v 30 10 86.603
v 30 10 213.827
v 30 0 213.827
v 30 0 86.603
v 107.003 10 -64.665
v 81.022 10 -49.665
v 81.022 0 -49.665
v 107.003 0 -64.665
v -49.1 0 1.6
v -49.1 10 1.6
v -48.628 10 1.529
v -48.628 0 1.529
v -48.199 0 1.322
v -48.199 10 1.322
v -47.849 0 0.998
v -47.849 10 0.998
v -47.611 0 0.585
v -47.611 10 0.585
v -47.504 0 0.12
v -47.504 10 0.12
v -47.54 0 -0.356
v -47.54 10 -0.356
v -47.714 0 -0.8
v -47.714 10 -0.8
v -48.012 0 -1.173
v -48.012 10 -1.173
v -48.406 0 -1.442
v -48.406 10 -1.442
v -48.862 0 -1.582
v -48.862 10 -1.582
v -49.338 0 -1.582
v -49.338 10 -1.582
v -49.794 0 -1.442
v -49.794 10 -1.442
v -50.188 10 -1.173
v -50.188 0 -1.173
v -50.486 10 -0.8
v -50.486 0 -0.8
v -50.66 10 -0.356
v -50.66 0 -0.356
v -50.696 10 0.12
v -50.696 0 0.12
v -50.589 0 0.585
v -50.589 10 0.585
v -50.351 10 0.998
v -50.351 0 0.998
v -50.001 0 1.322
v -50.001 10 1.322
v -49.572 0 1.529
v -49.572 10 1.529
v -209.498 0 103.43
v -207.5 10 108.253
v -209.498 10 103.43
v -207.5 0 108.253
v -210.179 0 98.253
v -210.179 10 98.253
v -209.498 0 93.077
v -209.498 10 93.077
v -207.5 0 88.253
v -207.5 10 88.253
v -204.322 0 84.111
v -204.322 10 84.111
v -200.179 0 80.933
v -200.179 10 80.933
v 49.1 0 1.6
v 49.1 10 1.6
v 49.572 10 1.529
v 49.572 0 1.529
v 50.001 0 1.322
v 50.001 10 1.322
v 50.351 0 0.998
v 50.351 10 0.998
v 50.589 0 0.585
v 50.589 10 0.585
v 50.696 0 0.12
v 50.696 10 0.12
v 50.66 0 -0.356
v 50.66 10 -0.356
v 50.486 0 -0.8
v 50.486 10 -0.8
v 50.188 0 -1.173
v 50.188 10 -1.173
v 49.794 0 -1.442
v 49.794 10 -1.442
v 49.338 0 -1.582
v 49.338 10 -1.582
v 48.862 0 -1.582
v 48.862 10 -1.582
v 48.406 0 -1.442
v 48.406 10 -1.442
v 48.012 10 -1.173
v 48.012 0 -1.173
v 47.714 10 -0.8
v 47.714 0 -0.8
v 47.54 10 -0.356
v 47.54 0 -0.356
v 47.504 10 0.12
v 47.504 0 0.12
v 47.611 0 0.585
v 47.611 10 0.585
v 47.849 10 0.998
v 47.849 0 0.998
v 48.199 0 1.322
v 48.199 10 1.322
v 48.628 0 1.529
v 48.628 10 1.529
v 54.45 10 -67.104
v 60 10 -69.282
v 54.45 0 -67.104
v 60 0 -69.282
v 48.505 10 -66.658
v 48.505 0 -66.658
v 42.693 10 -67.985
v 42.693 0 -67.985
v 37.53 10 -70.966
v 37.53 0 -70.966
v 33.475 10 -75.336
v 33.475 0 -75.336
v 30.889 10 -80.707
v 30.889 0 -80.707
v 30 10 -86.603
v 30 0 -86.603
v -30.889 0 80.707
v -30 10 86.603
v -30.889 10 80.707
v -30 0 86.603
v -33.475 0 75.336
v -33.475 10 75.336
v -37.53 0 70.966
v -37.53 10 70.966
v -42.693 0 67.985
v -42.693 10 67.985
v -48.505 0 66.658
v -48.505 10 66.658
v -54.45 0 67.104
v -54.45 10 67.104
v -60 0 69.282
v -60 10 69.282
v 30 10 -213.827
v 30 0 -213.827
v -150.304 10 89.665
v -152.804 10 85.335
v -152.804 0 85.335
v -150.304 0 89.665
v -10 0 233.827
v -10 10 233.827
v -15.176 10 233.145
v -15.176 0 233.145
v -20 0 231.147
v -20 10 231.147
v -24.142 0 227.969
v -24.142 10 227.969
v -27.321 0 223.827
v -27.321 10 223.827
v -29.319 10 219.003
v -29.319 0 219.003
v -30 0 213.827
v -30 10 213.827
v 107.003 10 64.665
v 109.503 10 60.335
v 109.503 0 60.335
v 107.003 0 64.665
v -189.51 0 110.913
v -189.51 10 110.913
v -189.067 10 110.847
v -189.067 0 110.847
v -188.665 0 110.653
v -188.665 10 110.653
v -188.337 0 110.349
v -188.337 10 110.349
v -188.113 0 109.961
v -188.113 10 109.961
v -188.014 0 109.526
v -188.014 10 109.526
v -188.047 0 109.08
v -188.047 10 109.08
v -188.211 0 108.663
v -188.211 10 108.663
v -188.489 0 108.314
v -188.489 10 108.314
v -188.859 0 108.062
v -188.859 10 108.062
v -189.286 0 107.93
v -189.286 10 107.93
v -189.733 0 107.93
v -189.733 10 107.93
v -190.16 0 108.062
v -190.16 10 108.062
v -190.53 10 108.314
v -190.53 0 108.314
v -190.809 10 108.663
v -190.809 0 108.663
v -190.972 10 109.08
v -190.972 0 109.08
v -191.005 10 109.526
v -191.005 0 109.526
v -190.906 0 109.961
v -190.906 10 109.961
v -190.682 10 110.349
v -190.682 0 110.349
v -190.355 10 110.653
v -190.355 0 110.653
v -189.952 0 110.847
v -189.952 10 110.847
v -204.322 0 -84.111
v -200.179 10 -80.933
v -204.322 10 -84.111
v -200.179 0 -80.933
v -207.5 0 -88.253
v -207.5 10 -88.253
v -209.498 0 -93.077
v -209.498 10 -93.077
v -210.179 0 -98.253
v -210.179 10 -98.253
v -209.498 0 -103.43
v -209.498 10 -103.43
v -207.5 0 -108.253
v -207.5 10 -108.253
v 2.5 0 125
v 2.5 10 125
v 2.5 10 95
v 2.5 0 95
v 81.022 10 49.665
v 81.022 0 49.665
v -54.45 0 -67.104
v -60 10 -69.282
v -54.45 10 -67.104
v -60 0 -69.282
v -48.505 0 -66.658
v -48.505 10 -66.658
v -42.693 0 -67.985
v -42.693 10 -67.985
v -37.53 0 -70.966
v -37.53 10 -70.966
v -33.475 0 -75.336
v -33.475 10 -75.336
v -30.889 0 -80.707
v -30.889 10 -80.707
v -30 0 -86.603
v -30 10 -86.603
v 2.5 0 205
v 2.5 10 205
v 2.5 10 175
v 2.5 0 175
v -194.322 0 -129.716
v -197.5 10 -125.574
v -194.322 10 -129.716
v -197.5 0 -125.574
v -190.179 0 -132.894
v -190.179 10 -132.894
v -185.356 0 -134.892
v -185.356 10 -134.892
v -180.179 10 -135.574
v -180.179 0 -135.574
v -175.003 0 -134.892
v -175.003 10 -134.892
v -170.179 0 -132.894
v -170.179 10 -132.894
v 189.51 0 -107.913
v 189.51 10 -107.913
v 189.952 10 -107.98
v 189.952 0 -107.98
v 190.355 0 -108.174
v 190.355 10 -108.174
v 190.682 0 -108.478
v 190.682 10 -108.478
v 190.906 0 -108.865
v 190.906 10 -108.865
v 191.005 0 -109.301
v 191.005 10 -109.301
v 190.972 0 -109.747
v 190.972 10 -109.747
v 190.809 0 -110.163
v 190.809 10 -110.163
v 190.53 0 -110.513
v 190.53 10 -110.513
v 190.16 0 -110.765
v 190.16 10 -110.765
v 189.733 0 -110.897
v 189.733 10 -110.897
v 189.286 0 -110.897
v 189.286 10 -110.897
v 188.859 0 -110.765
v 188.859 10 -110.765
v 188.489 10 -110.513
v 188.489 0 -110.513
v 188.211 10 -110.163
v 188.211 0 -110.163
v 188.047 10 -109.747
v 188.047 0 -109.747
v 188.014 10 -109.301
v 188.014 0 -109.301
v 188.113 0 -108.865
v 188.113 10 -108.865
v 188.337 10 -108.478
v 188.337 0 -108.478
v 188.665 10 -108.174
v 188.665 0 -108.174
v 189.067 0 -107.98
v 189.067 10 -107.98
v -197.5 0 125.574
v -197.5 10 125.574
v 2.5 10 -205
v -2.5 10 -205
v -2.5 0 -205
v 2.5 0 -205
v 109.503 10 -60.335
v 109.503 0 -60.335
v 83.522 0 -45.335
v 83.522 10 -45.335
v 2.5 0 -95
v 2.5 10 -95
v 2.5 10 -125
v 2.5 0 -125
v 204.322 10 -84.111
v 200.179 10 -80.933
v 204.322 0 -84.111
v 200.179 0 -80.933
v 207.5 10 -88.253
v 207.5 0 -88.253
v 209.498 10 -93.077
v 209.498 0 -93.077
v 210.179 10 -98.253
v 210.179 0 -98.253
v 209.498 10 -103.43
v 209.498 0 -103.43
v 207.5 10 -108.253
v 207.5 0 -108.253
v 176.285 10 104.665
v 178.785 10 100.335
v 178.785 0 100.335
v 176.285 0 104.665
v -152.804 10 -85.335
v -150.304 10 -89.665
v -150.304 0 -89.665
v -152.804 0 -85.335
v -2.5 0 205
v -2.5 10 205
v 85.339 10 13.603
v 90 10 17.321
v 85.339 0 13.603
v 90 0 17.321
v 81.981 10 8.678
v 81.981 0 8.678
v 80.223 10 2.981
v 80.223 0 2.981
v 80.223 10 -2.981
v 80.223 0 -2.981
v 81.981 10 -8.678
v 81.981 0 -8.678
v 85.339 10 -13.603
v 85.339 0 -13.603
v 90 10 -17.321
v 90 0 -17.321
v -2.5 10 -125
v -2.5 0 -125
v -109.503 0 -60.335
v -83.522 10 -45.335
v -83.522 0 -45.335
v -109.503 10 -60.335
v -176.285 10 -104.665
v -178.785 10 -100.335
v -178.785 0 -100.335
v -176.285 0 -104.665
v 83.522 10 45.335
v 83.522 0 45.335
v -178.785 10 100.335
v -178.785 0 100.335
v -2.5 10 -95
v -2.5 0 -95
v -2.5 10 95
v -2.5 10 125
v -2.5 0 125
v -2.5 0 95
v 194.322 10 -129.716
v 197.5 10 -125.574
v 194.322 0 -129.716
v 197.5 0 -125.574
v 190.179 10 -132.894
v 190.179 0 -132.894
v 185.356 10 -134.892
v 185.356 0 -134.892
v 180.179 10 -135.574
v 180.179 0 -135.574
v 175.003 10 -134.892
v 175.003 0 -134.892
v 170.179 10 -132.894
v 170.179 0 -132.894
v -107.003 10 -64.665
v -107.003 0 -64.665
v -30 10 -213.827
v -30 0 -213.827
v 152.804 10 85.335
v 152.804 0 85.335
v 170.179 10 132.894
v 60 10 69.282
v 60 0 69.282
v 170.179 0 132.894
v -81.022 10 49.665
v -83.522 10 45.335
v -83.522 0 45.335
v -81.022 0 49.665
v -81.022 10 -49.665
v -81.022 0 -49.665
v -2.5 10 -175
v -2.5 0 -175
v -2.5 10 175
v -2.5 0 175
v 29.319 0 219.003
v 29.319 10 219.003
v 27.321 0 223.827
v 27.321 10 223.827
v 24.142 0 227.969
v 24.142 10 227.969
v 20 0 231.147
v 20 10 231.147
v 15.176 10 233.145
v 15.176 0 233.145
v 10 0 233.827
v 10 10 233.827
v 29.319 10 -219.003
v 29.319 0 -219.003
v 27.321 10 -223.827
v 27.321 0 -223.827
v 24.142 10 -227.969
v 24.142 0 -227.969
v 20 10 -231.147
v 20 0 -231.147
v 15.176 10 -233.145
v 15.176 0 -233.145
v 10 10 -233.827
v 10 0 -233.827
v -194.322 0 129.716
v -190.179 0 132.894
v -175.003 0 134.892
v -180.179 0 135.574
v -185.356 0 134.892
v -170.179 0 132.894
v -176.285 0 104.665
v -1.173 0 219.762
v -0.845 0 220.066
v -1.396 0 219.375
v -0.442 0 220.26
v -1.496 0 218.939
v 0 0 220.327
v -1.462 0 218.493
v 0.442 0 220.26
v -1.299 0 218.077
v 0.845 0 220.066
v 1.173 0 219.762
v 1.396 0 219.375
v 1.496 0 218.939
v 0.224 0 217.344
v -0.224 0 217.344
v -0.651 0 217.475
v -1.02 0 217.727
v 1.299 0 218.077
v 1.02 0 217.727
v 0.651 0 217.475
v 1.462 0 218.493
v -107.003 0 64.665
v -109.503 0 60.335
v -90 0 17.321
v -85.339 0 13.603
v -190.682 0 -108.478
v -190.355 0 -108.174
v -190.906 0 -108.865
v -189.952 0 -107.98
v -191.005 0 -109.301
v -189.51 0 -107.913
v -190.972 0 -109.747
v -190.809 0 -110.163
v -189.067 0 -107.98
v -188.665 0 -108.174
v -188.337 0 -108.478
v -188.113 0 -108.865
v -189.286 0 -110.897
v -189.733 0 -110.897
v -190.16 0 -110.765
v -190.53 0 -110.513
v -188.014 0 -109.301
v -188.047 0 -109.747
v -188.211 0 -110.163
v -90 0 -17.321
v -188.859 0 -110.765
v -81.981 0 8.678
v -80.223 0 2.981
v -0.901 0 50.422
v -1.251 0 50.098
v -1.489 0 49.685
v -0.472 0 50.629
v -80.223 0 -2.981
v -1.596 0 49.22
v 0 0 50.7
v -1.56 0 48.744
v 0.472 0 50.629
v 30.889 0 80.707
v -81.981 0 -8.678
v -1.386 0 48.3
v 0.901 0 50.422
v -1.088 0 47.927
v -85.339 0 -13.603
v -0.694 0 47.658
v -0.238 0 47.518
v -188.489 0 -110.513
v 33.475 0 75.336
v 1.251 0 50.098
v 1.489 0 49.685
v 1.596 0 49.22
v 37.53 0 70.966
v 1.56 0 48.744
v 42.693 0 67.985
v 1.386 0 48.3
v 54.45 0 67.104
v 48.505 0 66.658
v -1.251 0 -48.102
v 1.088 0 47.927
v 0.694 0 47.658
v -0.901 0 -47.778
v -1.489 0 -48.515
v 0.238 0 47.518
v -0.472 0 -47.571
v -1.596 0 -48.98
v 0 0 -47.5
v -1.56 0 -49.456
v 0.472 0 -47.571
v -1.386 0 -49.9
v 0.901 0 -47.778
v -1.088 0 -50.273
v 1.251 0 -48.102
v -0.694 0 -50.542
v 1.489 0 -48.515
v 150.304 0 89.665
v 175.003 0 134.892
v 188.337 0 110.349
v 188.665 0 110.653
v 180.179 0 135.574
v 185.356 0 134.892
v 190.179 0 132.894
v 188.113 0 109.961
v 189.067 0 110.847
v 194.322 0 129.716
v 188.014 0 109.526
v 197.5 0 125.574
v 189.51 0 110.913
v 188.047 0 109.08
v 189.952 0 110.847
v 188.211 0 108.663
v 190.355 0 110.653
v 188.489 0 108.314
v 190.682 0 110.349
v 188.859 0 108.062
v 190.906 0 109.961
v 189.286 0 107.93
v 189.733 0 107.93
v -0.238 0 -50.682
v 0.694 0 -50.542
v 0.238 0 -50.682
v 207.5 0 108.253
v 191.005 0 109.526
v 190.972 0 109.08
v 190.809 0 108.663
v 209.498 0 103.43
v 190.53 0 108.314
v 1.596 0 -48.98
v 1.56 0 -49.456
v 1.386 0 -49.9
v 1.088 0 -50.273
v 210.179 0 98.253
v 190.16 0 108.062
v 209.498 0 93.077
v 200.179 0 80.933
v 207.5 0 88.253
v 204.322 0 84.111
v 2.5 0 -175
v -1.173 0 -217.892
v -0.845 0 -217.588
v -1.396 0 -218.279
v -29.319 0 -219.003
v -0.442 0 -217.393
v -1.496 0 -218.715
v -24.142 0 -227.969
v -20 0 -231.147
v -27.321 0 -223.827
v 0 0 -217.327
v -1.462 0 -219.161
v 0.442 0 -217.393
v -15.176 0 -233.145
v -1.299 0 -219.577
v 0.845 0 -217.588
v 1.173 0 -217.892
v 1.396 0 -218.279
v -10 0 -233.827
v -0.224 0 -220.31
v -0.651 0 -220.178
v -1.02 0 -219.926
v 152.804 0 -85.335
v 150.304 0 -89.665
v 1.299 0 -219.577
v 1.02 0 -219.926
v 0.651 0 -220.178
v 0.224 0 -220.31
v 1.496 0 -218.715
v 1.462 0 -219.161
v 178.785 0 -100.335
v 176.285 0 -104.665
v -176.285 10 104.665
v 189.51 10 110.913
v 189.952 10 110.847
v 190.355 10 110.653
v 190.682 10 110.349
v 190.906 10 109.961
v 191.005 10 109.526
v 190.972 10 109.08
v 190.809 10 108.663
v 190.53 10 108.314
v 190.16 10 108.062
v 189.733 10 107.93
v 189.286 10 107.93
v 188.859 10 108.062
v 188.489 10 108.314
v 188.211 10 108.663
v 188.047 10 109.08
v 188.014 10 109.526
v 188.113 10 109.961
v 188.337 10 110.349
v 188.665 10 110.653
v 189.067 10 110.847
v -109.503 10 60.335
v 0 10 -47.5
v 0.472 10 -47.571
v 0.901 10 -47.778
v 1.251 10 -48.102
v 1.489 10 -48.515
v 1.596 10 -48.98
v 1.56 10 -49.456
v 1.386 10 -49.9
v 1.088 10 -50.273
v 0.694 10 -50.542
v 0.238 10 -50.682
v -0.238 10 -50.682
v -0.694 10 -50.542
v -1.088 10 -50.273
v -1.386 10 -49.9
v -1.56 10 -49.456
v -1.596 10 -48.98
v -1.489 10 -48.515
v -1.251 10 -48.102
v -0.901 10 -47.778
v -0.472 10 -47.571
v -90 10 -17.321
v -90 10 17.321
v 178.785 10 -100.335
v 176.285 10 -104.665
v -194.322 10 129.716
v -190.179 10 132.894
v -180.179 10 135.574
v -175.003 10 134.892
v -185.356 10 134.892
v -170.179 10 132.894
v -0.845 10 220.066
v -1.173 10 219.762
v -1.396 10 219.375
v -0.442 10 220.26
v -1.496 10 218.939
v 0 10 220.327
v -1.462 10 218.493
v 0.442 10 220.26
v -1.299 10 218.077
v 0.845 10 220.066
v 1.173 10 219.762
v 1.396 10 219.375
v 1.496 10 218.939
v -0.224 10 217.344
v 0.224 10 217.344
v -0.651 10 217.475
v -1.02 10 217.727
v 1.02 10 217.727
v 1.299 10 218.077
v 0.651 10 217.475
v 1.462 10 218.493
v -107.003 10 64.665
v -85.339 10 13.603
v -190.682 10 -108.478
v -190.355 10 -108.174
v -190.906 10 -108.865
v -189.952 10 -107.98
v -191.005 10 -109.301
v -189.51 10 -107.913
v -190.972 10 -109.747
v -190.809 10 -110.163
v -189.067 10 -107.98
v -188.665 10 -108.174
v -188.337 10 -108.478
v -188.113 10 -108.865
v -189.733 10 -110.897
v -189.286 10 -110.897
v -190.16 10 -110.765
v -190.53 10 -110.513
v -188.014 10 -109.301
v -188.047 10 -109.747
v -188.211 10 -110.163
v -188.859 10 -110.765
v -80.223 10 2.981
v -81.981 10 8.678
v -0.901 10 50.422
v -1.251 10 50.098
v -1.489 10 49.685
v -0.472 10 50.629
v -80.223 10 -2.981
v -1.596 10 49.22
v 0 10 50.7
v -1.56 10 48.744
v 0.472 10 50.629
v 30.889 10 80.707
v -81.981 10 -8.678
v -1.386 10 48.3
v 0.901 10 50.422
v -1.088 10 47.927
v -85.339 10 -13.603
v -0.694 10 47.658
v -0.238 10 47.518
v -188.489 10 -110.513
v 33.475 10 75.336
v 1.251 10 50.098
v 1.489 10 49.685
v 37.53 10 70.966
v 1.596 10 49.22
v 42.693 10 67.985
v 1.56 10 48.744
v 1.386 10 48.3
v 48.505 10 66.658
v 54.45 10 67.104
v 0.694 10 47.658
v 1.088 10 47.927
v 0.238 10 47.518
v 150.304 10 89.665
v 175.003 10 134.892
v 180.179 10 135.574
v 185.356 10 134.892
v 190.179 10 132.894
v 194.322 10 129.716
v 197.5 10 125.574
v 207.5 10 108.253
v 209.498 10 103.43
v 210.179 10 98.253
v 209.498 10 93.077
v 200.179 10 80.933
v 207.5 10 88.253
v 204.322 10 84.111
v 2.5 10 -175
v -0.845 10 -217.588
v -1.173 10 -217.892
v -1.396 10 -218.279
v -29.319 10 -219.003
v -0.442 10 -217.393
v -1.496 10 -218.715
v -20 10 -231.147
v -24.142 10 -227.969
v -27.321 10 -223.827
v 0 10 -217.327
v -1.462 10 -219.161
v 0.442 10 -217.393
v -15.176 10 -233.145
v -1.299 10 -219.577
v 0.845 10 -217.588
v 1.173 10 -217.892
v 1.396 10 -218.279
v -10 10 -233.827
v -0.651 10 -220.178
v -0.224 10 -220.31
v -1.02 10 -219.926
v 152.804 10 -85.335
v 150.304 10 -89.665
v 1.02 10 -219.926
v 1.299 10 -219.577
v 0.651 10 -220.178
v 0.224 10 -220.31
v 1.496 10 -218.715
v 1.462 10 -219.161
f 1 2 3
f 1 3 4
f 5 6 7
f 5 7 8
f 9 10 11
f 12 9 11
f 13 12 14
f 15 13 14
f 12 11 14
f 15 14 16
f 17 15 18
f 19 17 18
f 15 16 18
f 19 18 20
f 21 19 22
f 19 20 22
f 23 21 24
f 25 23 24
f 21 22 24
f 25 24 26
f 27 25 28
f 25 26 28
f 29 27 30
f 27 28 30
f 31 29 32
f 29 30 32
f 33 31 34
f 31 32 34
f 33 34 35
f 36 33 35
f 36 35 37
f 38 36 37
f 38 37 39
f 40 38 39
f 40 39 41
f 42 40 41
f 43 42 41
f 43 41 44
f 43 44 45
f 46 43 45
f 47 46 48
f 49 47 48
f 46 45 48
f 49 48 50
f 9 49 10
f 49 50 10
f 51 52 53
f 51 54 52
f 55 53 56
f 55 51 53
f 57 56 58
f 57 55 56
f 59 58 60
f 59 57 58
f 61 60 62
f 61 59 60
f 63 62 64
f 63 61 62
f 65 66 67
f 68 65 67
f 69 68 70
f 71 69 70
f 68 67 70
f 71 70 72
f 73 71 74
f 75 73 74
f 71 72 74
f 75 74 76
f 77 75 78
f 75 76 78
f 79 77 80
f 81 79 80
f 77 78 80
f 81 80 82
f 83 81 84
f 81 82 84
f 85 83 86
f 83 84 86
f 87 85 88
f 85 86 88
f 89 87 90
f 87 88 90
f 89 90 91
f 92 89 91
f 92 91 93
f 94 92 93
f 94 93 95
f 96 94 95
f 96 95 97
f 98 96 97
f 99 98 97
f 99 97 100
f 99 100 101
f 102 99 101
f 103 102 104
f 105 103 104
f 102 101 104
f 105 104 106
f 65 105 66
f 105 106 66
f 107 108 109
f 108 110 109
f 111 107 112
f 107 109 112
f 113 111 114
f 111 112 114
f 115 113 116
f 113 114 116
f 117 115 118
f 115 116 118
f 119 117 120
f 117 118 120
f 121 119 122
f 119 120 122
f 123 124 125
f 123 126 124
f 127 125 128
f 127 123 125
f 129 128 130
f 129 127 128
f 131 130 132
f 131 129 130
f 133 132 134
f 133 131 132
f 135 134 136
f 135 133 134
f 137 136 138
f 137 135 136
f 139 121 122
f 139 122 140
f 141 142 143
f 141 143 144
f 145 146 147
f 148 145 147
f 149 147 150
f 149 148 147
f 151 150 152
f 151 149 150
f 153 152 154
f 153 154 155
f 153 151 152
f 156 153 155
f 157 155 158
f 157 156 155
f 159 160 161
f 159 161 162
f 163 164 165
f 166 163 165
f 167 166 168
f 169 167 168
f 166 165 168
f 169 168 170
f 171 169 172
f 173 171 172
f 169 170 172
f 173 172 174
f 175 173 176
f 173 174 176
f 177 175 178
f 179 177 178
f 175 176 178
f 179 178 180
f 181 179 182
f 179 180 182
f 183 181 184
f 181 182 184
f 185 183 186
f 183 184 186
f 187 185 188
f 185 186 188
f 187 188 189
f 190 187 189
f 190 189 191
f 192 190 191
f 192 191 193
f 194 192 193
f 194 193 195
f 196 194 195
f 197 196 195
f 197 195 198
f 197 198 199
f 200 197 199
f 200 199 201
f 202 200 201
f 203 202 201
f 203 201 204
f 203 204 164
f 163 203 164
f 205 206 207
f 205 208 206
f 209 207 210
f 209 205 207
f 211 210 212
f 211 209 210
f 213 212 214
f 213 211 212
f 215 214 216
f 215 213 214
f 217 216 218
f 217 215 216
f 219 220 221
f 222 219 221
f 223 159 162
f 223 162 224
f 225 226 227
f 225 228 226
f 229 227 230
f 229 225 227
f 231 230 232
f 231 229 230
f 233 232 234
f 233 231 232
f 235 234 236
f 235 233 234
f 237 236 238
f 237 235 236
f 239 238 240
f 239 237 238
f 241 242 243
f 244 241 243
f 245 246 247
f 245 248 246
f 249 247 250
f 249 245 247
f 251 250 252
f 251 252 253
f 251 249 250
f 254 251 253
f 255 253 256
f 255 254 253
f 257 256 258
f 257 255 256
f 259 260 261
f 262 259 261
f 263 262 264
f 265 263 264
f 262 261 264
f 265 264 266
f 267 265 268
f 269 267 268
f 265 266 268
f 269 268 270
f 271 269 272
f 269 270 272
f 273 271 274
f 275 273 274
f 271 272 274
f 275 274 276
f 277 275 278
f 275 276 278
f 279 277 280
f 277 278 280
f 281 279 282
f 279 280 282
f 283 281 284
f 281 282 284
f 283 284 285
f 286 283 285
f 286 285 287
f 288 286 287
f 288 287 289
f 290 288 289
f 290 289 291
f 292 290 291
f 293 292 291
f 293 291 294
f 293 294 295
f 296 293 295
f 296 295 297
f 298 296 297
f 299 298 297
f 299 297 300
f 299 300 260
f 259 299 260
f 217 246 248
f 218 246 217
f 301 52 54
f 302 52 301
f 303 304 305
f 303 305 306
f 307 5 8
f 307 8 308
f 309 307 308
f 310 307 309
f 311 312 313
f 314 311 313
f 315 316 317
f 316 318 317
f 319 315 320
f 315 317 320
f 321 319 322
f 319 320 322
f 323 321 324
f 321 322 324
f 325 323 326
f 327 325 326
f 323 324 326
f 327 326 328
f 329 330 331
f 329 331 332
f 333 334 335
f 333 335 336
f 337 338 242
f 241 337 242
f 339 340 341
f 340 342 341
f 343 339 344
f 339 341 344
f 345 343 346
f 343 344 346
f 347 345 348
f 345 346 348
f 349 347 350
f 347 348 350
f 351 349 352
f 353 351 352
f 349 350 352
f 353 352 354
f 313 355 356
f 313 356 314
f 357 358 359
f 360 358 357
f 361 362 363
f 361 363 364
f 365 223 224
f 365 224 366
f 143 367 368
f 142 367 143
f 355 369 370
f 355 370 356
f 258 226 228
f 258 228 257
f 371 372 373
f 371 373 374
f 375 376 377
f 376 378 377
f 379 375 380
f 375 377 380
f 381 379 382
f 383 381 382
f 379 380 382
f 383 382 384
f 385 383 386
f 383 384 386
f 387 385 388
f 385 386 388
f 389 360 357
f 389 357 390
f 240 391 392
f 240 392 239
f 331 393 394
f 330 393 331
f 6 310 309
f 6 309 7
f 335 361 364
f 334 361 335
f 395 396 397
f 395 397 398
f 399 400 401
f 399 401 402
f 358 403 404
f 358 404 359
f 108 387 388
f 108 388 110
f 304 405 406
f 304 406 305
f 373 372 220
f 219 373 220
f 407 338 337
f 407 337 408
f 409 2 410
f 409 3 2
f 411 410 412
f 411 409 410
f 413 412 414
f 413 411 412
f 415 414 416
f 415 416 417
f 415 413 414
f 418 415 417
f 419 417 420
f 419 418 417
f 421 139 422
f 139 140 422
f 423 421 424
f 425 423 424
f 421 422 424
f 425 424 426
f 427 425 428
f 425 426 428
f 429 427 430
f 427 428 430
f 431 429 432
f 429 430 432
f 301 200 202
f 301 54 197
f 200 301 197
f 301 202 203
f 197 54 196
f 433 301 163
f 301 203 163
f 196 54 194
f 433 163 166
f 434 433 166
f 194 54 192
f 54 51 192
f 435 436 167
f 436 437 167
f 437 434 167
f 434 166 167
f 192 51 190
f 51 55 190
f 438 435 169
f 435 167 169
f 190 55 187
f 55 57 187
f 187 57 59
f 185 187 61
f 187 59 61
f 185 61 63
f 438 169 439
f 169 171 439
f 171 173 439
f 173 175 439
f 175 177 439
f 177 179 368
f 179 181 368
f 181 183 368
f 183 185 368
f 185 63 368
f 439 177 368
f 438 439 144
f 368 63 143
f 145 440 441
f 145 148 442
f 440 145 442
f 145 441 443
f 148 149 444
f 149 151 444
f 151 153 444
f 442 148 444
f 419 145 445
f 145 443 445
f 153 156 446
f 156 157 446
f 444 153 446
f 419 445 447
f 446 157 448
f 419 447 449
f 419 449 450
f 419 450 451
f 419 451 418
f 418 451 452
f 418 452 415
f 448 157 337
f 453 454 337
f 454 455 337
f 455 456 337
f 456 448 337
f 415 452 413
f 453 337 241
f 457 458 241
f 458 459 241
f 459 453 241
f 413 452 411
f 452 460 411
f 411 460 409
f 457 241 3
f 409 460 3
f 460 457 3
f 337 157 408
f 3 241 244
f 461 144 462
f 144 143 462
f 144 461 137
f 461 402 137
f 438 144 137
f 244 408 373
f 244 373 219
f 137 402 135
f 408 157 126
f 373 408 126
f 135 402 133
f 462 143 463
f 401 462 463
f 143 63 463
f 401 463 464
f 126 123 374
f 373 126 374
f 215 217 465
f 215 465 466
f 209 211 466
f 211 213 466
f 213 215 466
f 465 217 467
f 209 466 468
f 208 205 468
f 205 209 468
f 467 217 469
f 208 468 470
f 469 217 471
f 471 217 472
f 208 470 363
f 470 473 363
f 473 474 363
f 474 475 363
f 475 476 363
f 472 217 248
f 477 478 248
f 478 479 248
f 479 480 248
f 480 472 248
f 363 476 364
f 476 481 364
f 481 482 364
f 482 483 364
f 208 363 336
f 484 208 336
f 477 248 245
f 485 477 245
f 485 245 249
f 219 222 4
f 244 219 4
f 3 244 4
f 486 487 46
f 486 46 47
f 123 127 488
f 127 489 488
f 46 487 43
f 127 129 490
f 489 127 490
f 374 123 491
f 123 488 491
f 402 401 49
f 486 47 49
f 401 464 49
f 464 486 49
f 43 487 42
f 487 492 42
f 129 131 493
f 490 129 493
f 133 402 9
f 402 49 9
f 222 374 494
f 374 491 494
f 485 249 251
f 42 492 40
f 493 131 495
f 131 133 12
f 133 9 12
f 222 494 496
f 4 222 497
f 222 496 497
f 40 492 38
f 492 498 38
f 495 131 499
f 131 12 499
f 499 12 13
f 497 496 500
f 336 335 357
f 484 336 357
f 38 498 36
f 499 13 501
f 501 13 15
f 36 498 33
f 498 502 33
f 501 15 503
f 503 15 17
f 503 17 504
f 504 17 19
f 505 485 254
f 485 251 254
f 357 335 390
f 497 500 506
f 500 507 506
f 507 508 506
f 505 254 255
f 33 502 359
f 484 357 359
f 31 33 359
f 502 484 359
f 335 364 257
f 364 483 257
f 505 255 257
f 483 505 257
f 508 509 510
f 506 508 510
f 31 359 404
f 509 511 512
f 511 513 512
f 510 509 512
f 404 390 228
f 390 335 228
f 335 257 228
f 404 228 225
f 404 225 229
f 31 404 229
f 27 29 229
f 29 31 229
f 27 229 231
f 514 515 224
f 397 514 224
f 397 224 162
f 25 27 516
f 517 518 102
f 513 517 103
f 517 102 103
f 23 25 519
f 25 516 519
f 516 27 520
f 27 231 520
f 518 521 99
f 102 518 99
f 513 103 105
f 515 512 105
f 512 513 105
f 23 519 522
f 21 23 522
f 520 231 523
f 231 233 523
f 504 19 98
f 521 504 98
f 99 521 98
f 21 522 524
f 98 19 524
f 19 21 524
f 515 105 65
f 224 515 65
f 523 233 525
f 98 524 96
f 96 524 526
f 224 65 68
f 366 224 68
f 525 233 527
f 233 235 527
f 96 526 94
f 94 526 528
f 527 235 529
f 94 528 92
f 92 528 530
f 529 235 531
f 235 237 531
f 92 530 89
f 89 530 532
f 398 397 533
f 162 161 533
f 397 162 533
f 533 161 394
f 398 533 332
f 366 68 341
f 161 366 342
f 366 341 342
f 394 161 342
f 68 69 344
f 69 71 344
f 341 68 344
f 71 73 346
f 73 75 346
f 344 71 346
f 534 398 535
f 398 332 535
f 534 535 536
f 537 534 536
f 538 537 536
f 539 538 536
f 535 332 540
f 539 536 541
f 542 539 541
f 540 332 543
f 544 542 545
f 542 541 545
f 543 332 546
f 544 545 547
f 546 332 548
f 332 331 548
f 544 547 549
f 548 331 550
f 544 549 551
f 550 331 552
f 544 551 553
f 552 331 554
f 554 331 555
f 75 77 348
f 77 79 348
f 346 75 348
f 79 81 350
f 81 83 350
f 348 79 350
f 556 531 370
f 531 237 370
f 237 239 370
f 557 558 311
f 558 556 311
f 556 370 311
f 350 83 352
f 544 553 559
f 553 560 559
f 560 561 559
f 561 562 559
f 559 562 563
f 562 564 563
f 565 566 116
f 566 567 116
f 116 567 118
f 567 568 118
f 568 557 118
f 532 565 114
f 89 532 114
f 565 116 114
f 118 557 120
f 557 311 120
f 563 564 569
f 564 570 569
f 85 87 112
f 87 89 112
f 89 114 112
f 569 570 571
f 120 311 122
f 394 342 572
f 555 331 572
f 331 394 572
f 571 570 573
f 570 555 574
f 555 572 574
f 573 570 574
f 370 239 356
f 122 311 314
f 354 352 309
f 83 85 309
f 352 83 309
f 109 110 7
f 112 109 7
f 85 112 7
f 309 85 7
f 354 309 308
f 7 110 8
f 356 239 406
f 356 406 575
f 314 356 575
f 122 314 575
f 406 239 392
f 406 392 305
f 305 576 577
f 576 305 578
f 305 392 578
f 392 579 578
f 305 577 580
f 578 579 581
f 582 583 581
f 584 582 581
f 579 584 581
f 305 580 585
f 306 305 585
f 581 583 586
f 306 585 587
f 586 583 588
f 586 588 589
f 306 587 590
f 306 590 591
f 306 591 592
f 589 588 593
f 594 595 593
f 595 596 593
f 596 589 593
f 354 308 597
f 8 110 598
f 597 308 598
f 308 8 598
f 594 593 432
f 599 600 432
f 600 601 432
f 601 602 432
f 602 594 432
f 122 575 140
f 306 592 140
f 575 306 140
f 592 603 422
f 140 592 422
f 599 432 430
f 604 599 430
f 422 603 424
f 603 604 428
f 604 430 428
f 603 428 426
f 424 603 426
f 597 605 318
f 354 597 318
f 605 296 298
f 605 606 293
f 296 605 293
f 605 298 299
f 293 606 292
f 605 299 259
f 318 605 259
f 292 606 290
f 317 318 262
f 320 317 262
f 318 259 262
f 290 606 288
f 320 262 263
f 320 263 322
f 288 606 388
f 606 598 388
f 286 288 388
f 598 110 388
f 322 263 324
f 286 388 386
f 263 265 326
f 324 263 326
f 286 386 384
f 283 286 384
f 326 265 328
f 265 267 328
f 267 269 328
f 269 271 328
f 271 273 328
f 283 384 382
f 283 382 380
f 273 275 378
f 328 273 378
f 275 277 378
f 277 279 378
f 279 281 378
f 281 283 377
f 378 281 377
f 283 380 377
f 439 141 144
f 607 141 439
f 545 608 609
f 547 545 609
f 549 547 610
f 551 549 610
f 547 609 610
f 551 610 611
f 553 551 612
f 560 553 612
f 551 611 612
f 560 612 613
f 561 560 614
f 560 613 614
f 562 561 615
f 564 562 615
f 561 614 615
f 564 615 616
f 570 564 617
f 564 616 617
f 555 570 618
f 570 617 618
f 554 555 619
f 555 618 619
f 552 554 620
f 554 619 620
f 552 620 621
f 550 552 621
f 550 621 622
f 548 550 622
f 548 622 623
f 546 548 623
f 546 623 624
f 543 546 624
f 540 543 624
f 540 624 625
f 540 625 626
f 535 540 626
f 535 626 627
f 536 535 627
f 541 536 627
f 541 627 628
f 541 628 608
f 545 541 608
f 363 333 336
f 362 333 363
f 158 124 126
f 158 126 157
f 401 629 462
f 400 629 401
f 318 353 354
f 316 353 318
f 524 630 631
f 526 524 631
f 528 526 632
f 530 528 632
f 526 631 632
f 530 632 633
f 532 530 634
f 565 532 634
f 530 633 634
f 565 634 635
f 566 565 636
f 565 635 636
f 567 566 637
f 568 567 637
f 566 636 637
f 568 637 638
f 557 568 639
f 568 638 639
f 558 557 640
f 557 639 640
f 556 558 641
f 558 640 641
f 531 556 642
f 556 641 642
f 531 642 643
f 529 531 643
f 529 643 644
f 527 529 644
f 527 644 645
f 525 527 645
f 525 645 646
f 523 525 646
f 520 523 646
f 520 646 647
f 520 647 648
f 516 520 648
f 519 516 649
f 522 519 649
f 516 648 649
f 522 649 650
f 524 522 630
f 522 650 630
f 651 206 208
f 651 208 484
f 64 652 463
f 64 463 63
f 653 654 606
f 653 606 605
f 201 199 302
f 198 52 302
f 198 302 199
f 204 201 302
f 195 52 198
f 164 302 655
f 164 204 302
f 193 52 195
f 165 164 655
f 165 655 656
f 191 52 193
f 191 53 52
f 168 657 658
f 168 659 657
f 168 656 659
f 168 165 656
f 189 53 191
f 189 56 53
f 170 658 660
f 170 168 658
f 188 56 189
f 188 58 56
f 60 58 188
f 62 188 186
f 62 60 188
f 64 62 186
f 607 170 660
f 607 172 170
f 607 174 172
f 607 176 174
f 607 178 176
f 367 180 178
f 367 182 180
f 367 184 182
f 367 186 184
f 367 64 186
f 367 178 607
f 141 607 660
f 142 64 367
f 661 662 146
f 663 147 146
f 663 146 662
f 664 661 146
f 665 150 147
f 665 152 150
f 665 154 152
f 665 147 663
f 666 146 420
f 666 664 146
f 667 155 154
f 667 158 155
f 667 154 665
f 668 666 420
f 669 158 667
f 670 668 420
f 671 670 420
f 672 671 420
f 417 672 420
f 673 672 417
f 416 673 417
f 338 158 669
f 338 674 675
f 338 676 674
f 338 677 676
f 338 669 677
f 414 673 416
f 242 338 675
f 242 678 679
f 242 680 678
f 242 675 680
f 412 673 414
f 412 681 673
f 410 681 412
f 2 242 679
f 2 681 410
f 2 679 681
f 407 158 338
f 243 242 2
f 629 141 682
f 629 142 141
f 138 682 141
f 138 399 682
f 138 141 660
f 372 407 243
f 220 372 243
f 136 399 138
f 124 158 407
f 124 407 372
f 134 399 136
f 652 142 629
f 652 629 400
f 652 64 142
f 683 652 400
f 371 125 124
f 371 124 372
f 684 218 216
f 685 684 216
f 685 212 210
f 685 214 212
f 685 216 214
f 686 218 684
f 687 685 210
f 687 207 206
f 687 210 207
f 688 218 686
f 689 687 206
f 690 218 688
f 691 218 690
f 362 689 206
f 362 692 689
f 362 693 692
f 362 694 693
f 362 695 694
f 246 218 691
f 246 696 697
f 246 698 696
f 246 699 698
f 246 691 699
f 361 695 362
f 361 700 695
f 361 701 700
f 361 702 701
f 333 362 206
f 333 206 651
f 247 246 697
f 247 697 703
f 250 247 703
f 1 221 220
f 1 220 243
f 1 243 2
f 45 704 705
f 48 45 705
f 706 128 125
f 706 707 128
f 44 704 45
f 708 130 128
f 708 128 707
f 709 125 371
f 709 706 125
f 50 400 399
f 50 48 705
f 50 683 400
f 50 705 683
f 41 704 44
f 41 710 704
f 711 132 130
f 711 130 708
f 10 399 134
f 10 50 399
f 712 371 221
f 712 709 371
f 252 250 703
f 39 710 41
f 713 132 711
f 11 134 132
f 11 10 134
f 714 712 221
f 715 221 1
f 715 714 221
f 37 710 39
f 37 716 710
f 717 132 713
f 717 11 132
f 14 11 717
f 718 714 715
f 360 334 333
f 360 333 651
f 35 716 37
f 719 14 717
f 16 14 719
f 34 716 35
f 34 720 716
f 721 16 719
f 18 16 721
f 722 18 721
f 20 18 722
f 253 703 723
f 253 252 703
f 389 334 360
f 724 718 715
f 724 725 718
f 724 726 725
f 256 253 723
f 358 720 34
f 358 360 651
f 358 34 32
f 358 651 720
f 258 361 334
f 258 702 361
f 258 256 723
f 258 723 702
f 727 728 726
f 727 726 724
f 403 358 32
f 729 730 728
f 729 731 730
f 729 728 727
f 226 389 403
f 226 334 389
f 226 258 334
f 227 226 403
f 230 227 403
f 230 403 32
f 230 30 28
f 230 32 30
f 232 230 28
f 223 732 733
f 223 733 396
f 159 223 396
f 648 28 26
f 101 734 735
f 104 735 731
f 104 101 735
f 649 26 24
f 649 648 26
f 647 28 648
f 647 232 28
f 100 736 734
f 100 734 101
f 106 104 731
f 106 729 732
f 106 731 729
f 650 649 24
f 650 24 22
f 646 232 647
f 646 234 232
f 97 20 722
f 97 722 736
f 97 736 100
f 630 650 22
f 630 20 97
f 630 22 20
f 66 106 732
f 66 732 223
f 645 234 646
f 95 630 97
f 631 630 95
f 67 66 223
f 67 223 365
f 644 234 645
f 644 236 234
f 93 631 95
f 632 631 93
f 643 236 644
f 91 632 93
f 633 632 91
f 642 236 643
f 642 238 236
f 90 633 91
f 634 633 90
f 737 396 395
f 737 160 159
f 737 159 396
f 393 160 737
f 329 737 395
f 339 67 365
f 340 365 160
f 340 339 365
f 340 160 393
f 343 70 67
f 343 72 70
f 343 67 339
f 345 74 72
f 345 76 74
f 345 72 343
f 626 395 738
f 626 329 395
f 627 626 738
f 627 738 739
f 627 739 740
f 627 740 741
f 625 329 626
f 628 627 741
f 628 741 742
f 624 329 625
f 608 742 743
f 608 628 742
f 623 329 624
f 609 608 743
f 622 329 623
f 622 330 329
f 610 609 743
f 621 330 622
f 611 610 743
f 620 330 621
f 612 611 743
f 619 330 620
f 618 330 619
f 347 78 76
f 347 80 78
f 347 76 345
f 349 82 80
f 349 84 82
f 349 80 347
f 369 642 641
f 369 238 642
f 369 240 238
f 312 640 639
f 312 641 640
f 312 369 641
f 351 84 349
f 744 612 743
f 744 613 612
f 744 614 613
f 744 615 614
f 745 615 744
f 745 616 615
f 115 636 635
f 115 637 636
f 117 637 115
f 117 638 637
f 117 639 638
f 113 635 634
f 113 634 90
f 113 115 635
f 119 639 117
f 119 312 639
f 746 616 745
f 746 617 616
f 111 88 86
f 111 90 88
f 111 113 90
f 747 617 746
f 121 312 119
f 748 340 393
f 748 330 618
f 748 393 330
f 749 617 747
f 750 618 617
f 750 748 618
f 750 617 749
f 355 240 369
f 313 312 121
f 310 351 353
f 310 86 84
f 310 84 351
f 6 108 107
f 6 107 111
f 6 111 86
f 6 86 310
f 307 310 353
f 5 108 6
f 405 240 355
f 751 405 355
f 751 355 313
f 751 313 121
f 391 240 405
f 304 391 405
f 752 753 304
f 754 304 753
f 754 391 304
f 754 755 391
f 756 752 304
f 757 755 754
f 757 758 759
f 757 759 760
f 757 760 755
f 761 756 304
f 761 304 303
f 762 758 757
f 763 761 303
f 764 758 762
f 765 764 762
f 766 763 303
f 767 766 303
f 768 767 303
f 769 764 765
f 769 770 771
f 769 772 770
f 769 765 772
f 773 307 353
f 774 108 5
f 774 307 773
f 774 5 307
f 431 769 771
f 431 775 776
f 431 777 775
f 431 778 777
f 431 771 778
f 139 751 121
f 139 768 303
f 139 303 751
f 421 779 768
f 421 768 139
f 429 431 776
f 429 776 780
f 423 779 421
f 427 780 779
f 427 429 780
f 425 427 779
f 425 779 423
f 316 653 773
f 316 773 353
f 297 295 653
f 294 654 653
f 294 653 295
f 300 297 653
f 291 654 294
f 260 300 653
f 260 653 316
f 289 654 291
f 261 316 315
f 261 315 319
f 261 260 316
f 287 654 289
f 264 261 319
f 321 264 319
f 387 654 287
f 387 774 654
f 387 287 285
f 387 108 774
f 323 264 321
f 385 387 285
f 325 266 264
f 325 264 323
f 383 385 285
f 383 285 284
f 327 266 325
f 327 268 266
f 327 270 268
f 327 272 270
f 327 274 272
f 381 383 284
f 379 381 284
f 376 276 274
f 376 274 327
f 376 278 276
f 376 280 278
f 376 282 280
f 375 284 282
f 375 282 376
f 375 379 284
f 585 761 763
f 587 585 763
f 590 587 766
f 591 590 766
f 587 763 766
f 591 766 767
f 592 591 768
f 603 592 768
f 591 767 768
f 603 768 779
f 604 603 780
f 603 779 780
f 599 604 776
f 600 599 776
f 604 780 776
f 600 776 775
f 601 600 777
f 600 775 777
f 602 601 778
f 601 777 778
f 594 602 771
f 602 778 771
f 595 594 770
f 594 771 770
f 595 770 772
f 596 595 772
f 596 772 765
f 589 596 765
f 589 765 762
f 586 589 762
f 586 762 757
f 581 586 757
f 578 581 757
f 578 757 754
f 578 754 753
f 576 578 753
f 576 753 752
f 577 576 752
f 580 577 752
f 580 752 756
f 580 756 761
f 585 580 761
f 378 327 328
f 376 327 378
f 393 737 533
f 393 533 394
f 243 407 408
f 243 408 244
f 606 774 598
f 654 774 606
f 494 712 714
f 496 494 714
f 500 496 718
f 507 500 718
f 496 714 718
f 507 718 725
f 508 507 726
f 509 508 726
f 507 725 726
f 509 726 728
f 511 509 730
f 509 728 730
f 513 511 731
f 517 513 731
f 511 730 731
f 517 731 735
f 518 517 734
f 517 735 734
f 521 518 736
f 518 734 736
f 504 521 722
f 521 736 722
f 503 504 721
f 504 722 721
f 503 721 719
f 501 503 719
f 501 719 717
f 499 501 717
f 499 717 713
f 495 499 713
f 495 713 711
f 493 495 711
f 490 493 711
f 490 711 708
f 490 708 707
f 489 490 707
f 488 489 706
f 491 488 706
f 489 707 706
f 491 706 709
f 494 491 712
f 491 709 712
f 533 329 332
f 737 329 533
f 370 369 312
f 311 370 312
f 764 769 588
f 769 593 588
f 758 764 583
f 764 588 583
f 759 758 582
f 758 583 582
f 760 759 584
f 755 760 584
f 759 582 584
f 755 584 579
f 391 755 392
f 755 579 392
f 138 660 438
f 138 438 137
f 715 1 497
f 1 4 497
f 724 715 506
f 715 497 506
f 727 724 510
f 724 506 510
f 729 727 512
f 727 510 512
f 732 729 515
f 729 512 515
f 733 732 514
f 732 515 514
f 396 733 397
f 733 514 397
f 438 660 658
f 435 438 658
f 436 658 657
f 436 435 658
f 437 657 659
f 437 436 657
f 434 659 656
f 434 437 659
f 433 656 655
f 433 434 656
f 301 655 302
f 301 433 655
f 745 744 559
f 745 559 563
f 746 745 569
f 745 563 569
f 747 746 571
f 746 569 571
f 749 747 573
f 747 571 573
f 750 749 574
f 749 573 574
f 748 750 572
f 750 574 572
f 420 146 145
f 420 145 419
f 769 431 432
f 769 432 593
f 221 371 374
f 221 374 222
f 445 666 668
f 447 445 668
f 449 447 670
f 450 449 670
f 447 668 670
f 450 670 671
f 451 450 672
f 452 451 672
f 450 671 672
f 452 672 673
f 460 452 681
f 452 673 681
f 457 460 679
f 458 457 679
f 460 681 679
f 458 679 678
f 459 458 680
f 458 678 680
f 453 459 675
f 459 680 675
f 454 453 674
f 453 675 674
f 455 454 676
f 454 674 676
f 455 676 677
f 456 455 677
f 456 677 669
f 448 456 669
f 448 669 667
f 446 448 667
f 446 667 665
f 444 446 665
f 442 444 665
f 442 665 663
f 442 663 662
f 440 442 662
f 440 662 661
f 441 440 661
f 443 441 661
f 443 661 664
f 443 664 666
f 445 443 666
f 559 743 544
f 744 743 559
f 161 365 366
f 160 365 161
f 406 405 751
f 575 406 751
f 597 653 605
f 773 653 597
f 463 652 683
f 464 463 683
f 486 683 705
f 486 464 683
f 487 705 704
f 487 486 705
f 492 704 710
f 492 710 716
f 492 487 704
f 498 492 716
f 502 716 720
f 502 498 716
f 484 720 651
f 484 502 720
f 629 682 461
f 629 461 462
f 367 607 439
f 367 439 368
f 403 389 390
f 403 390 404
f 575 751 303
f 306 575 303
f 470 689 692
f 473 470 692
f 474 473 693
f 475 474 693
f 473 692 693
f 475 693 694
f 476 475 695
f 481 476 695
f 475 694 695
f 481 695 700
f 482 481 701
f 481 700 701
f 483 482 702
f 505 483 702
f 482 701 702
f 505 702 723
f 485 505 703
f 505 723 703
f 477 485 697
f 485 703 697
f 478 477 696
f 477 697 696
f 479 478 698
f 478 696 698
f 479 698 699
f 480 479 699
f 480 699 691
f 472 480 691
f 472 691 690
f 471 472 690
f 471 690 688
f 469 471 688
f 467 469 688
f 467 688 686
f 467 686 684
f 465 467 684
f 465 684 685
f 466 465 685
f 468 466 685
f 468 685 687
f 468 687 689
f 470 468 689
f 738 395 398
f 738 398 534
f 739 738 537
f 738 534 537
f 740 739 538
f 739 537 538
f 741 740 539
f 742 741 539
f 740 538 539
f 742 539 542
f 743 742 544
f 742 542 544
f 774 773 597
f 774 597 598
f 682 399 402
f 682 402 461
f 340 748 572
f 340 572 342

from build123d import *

# Parameters (mm, degrees)
SKETCH_2_W          = 46
SKETCH_2_H          = 46
EXTRUDE_1_DEPTH     = 10
SKETCH_4_R          = 55
SKETCH_4_R_2        = 1.6
EXTRUDE_2_DEPTH     = 10
SKETCH_5_R          = 55
EXTRUDE_3_DEPTH     = 10
SKETCH_6_R          = 1.5
SKETCH_6_W          = 5
SKETCH_6_H          = 30
CUT_EXTRUDE_1_DEPTH = 320.501564941
FILLET_1_R          = 20


with BuildPart() as part:
    # 草图2 → 凸台-拉伸1 (new body)
    with BuildSketch(Plane(origin=(0, 0, 0), x_dir=(1, 0, 0), z_dir=(0, 1, 0))):
        Rectangle(SKETCH_2_W, SKETCH_2_H)
    extrude(amount=EXTRUDE_1_DEPTH)

    # 草图4 → 凸台-拉伸2 (add)
    with BuildSketch(Plane(origin=(0, 10, 0), x_dir=(1, 0, 0), z_dir=(0, 1, 0))):
        with Locations(Location((0, 0, 0), (0, 0, 270))):
            Circle(SKETCH_4_R)
        with Locations(Location((-49.1, 0, 0), (0, 0, 270))):
            Circle(SKETCH_4_R_2, mode=Mode.SUBTRACT)
        with Locations(Location((0, -49.1, 0), (0, 0, 270))):
            Circle(SKETCH_4_R_2, mode=Mode.SUBTRACT)
        with Locations(Location((49.1, 0, 0), (0, 0, 270))):
            Circle(SKETCH_4_R_2, mode=Mode.SUBTRACT)
        with Locations(Location((0, 49.1, 0), (0, 0, 270))):
            Circle(SKETCH_4_R_2, mode=Mode.SUBTRACT)
    extrude(amount=-EXTRUDE_2_DEPTH)

    # 草图5 → 凸台-拉伸3 (add)
    with BuildSketch(Plane(origin=(0, 10, 0), x_dir=(1, 0, 0), z_dir=(0, 1, 0))):
        Polygon((30, -233.826859022), (30, -51.961524227), (187.5, -142.894191624), (217.5, -90.932667397), (60, 0), (217.5, 90.932667397), (187.5, 142.894191624), (30, 51.961524227), (30, 233.826859022), (-30, 233.826859022), (-30, 51.961524227), (-187.5, 142.894191624), (-217.5, 90.932667397), (-60, 0), (-217.5, -90.932667397), (-187.5, -142.894191624), (-30, -51.961524227), (-30, -233.826859022), align=None)
        Circle(SKETCH_5_R, mode=Mode.SUBTRACT)
    extrude(amount=-EXTRUDE_3_DEPTH)

    # 草图6 → 切除-拉伸1 (cut, through all)
    with BuildSketch(Plane(origin=(0, 10, 0), x_dir=(1, 0, 0), z_dir=(0, 1, 0))):
        with Locations(Location((0, 218.826859022, 0), (0, 0, 270))):
            Circle(SKETCH_6_R)
        with Locations(Location((189.509618943, 109.413429511, 0), (0, 0, 270))):
            Circle(SKETCH_6_R)
        with Locations(Location((189.509618943, -109.413429511, 0), (0, 0, 270))):
            Circle(SKETCH_6_R)
        with Locations(Location((0, -218.826859022, 0), (0, 0, 270))):
            Circle(SKETCH_6_R)
        with Locations(Location((-189.509618943, -109.413429511, 0), (0, 0, 270))):
            Circle(SKETCH_6_R)
        with Locations(Location((-189.509618943, 109.413429511, 0), (0, 0, 270))):
            Circle(SKETCH_6_R)
        Polygon((152.804445662, 85.334936491), (150.304445662, 89.665063509), (176.285207776, 104.665063509), (178.785207776, 100.334936491), align=None)
        with Locations((0, 190)):
            Rectangle(SKETCH_6_W, SKETCH_6_H)
        with Locations((0, 110)):
            Rectangle(SKETCH_6_W, SKETCH_6_H)
        Polygon((83.52241336, 45.334936491), (81.02241336, 49.665063509), (107.003175473, 64.665063509), (109.503175473, 60.334936491), align=None)
        Polygon((-107.003175473, -64.665063509), (-109.503175473, -60.334936491), (-83.52241336, -45.334936491), (-81.02241336, -49.665063509), align=None)
        Polygon((81.02241336, -49.665063509), (83.52241336, -45.334936491), (109.503175473, -60.334936491), (107.003175473, -64.665063509), align=None)
        Polygon((-109.503175473, 60.334936491), (-107.003175473, 64.665063509), (-81.02241336, 49.665063509), (-83.52241336, 45.334936491), align=None)
        Polygon((-176.285207776, -104.665063509), (-178.785207776, -100.334936491), (-152.804445662, -85.334936491), (-150.304445662, -89.665063509), align=None)
        Polygon((150.304445662, -89.665063509), (152.804445662, -85.334936491), (178.785207776, -100.334936491), (176.285207776, -104.665063509), align=None)
        Polygon((-178.785207776, 100.334936491), (-176.285207776, 104.665063509), (-150.304445662, 89.665063509), (-152.804445662, 85.334936491), align=None)
        with Locations((0, -110)):
            Rectangle(SKETCH_6_W, SKETCH_6_H)
        with Locations((0, -190)):
            Rectangle(SKETCH_6_W, SKETCH_6_H)
    extrude(amount=-CUT_EXTRUDE_1_DEPTH, mode=Mode.SUBTRACT)

    # 圆角1
    fillet_1_edges = [part.edges().sort_by_distance(p)[0] for p in [
        (187.5, 5, -142.894191624),
        (217.5, 5, -90.932667397),
        (60, 5, 0),
        (217.5, 5, 90.932667397),
        (187.5, 5, 142.894191624),
        (30, 5, 51.961524227),
        (30, 5, 233.826859022),
        (-30, 5, 233.826859022),
        (-30, 5, 51.961524227),
        (-187.5, 5, 142.894191624),
        (-217.5, 5, 90.932667397),
        (-60, 5, 0),
        (-217.5, 5, -90.932667397),
        (-187.5, 5, -142.894191624),
        (-30, 5, -51.961524227),
        (-30, 5, -233.826859022),
        (30, 5, -233.826859022),
        (30, 5, -51.961524227),
    ]]
    fillet(fillet_1_edges, radius=FILLET_1_R)


solid = part.part
